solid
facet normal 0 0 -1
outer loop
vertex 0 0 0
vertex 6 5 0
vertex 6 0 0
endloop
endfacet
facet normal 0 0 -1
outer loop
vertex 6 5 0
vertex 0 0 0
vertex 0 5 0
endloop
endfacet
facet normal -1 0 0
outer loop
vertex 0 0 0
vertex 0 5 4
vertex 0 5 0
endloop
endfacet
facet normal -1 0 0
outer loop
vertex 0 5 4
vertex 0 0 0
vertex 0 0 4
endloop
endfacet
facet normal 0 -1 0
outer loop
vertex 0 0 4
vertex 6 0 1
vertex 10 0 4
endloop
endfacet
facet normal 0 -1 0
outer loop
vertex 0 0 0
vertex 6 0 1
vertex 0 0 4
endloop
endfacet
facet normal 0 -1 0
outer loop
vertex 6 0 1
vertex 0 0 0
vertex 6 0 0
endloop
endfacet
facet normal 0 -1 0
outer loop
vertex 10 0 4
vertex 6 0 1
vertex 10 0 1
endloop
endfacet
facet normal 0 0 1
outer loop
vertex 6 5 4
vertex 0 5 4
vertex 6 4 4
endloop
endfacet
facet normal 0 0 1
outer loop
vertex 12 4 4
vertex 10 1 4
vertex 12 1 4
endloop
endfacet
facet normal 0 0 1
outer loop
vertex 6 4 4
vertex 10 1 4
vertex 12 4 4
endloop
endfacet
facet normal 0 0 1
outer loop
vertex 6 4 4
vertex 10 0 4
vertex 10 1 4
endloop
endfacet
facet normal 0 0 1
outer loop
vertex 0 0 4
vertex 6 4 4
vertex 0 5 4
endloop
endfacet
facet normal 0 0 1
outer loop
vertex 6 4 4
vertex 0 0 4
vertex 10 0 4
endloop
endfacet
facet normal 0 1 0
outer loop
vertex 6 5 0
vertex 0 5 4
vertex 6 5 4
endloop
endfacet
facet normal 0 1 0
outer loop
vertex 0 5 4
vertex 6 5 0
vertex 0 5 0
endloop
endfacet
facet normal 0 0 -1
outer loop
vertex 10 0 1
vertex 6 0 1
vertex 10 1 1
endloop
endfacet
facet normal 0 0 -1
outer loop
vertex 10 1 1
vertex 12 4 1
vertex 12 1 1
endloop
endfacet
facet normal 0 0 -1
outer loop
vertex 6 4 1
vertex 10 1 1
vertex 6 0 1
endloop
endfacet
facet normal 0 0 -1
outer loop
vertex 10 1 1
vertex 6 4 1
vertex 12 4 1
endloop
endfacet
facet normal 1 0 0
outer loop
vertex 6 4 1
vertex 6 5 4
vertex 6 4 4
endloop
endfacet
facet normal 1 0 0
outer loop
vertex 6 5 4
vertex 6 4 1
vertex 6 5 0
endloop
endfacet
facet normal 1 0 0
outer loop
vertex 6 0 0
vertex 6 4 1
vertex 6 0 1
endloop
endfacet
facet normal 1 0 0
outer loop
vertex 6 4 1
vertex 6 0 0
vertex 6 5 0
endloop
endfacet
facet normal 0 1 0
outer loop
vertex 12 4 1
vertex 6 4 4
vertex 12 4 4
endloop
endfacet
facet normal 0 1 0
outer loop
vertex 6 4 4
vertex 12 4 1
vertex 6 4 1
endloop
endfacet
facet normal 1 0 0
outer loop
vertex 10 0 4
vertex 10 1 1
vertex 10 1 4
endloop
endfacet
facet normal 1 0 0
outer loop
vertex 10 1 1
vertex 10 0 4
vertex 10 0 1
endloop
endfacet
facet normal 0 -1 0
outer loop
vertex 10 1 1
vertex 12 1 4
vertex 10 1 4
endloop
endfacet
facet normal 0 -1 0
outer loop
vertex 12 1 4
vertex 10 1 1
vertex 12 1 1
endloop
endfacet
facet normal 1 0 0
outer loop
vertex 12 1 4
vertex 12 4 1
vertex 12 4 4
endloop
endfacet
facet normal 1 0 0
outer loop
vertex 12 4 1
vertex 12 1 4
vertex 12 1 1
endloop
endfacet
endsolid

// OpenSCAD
union() {
    translate([0, 0, 0]) cube([1, 1, 1]);
    translate([0, 0, 1]) cube([1, 1, 1]);
    translate([0, 0, 2]) cube([1, 1, 1]);
    translate([0, 0, 3]) cube([1, 1, 1]);
    translate([0, 1, 0]) cube([1, 1, 1]);
    translate([0, 1, 1]) cube([1, 1, 1]);
    translate([0, 1, 2]) cube([1, 1, 1]);
    translate([0, 1, 3]) cube([1, 1, 1]);
    translate([0, 2, 0]) cube([1, 1, 1]);
    translate([0, 2, 1]) cube([1, 1, 1]);
    translate([0, 2, 2]) cube([1, 1, 1]);
    translate([0, 2, 3]) cube([1, 1, 1]);
    translate([0, 3, 0]) cube([1, 1, 1]);
    translate([0, 3, 1]) cube([1, 1, 1]);
    translate([0, 3, 2]) cube([1, 1, 1]);
    translate([0, 3, 3]) cube([1, 1, 1]);
    translate([0, 4, 0]) cube([1, 1, 1]);
    translate([0, 4, 1]) cube([1, 1, 1]);
    translate([0, 4, 2]) cube([1, 1, 1]);
    translate([0, 4, 3]) cube([1, 1, 1]);
    translate([1, 0, 0]) cube([1, 1, 1]);
    translate([1, 0, 1]) cube([1, 1, 1]);
    translate([1, 0, 2]) cube([1, 1, 1]);
    translate([1, 0, 3]) cube([1, 1, 1]);
    translate([1, 1, 0]) cube([1, 1, 1]);
    translate([1, 1, 1]) cube([1, 1, 1]);
    translate([1, 1, 2]) cube([1, 1, 1]);
    translate([1, 1, 3]) cube([1, 1, 1]);
    translate([1, 2, 0]) cube([1, 1, 1]);
    translate([1, 2, 1]) cube([1, 1, 1]);
    translate([1, 2, 2]) cube([1, 1, 1]);
    translate([1, 2, 3]) cube([1, 1, 1]);
    translate([1, 3, 0]) cube([1, 1, 1]);
    translate([1, 3, 1]) cube([1, 1, 1]);
    translate([1, 3, 2]) cube([1, 1, 1]);
    translate([1, 3, 3]) cube([1, 1, 1]);
    translate([1, 4, 0]) cube([1, 1, 1]);
    translate([1, 4, 1]) cube([1, 1, 1]);
    translate([1, 4, 2]) cube([1, 1, 1]);
    translate([1, 4, 3]) cube([1, 1, 1]);
    translate([2, 0, 0]) cube([1, 1, 1]);
    translate([2, 0, 1]) cube([1, 1, 1]);
    translate([2, 0, 2]) cube([1, 1, 1]);
    translate([2, 0, 3]) cube([1, 1, 1]);
    translate([2, 1, 0]) cube([1, 1, 1]);
    translate([2, 1, 1]) cube([1, 1, 1]);
    translate([2, 1, 2]) cube([1, 1, 1]);
    translate([2, 1, 3]) cube([1, 1, 1]);
    translate([2, 2, 0]) cube([1, 1, 1]);
    translate([2, 2, 1]) cube([1, 1, 1]);
    translate([2, 2, 2]) cube([1, 1, 1]);
    translate([2, 2, 3]) cube([1, 1, 1]);
    translate([2, 3, 0]) cube([1, 1, 1]);
    translate([2, 3, 1]) cube([1, 1, 1]);
    translate([2, 3, 2]) cube([1, 1, 1]);
    translate([2, 3, 3]) cube([1, 1, 1]);
    translate([2, 4, 0]) cube([1, 1, 1]);
    translate([2, 4, 1]) cube([1, 1, 1]);
    translate([2, 4, 2]) cube([1, 1, 1]);
    translate([2, 4, 3]) cube([1, 1, 1]);
    translate([3, 0, 0]) cube([1, 1, 1]);
    translate([3, 0, 1]) cube([1, 1, 1]);
    translate([3, 0, 2]) cube([1, 1, 1]);
    translate([3, 0, 3]) cube([1, 1, 1]);
    translate([3, 1, 0]) cube([1, 1, 1]);
    translate([3, 1, 1]) cube([1, 1, 1]);
    translate([3, 1, 2]) cube([1, 1, 1]);
    translate([3, 1, 3]) cube([1, 1, 1]);
    translate([3, 2, 0]) cube([1, 1, 1]);
    translate([3, 2, 1]) cube([1, 1, 1]);
    translate([3, 2, 2]) cube([1, 1, 1]);
    translate([3, 2, 3]) cube([1, 1, 1]);
    translate([3, 3, 0]) cube([1, 1, 1]);
    translate([3, 3, 1]) cube([1, 1, 1]);
    translate([3, 3, 2]) cube([1, 1, 1]);
    translate([3, 3, 3]) cube([1, 1, 1]);
    translate([3, 4, 0]) cube([1, 1, 1]);
    translate([3, 4, 1]) cube([1, 1, 1]);
    translate([3, 4, 2]) cube([1, 1, 1]);
    translate([3, 4, 3]) cube([1, 1, 1]);
    translate([4, 0, 0]) cube([1, 1, 1]);
    translate([4, 0, 1]) cube([1, 1, 1]);
    translate([4, 0, 2]) cube([1, 1, 1]);
    translate([4, 0, 3]) cube([1, 1, 1]);
    translate([4, 1, 0]) cube([1, 1, 1]);
    translate([4, 1, 1]) cube([1, 1, 1]);
    translate([4, 1, 2]) cube([1, 1, 1]);
    translate([4, 1, 3]) cube([1, 1, 1]);
    translate([4, 2, 0]) cube([1, 1, 1]);
    translate([4, 2, 1]) cube([1, 1, 1]);
    translate([4, 2, 2]) cube([1, 1, 1]);
    translate([4, 2, 3]) cube([1, 1, 1]);
    translate([4, 3, 0]) cube([1, 1, 1]);
    translate([4, 3, 1]) cube([1, 1, 1]);
    translate([4, 3, 2]) cube([1, 1, 1]);
    translate([4, 3, 3]) cube([1, 1, 1]);
    translate([4, 4, 0]) cube([1, 1, 1]);
    translate([4, 4, 1]) cube([1, 1, 1]);
    translate([4, 4, 2]) cube([1, 1, 1]);
    translate([4, 4, 3]) cube([1, 1, 1]);
    translate([5, 0, 0]) cube([1, 1, 1]);
    translate([5, 0, 1]) cube([1, 1, 1]);
    translate([5, 0, 2]) cube([1, 1, 1]);
    translate([5, 0, 3]) cube([1, 1, 1]);
    translate([5, 1, 0]) cube([1, 1, 1]);
    translate([5, 1, 1]) cube([1, 1, 1]);
    translate([5, 1, 2]) cube([1, 1, 1]);
    translate([5, 1, 3]) cube([1, 1, 1]);
    translate([5, 2, 0]) cube([1, 1, 1]);
    translate([5, 2, 1]) cube([1, 1, 1]);
    translate([5, 2, 2]) cube([1, 1, 1]);
    translate([5, 2, 3]) cube([1, 1, 1]);
    translate([5, 3, 0]) cube([1, 1, 1]);
    translate([5, 3, 1]) cube([1, 1, 1]);
    translate([5, 3, 2]) cube([1, 1, 1]);
    translate([5, 3, 3]) cube([1, 1, 1]);
    translate([5, 4, 0]) cube([1, 1, 1]);
    translate([5, 4, 1]) cube([1, 1, 1]);
    translate([5, 4, 2]) cube([1, 1, 1]);
    translate([5, 4, 3]) cube([1, 1, 1]);
    translate([6, 0, 1]) cube([1, 1, 1]);
    translate([6, 0, 2]) cube([1, 1, 1]);
    translate([6, 0, 3]) cube([1, 1, 1]);
    translate([6, 1, 1]) cube([1, 1, 1]);
    translate([6, 1, 2]) cube([1, 1, 1]);
    translate([6, 1, 3]) cube([1, 1, 1]);
    translate([6, 2, 1]) cube([1, 1, 1]);
    translate([6, 2, 2]) cube([1, 1, 1]);
    translate([6, 2, 3]) cube([1, 1, 1]);
    translate([6, 3, 1]) cube([1, 1, 1]);
    translate([6, 3, 2]) cube([1, 1, 1]);
    translate([6, 3, 3]) cube([1, 1, 1]);
    translate([7, 0, 1]) cube([1, 1, 1]);
    translate([7, 0, 2]) cube([1, 1, 1]);
    translate([7, 0, 3]) cube([1, 1, 1]);
    translate([7, 1, 1]) cube([1, 1, 1]);
    translate([7, 1, 2]) cube([1, 1, 1]);
    translate([7, 1, 3]) cube([1, 1, 1]);
    translate([7, 2, 1]) cube([1, 1, 1]);
    translate([7, 2, 2]) cube([1, 1, 1]);
    translate([7, 2, 3]) cube([1, 1, 1]);
    translate([7, 3, 1]) cube([1, 1, 1]);
    translate([7, 3, 2]) cube([1, 1, 1]);
    translate([7, 3, 3]) cube([1, 1, 1]);
    translate([8, 0, 1]) cube([1, 1, 1]);
    translate([8, 0, 2]) cube([1, 1, 1]);
    translate([8, 0, 3]) cube([1, 1, 1]);
    translate([8, 1, 1]) cube([1, 1, 1]);
    translate([8, 1, 2]) cube([1, 1, 1]);
    translate([8, 1, 3]) cube([1, 1, 1]);
    translate([8, 2, 1]) cube([1, 1, 1]);
    translate([8, 2, 2]) cube([1, 1, 1]);
    translate([8, 2, 3]) cube([1, 1, 1]);
    translate([8, 3, 1]) cube([1, 1, 1]);
    translate([8, 3, 2]) cube([1, 1, 1]);
    translate([8, 3, 3]) cube([1, 1, 1]);
    translate([9, 0, 1]) cube([1, 1, 1]);
    translate([9, 0, 2]) cube([1, 1, 1]);
    translate([9, 0, 3]) cube([1, 1, 1]);
    translate([9, 1, 1]) cube([1, 1, 1]);
    translate([9, 1, 2]) cube([1, 1, 1]);
    translate([9, 1, 3]) cube([1, 1, 1]);
    translate([9, 2, 1]) cube([1, 1, 1]);
    translate([9, 2, 2]) cube([1, 1, 1]);
    translate([9, 2, 3]) cube([1, 1, 1]);
    translate([9, 3, 1]) cube([1, 1, 1]);
    translate([9, 3, 2]) cube([1, 1, 1]);
    translate([9, 3, 3]) cube([1, 1, 1]);
    translate([10, 1, 1]) cube([1, 1, 1]);
    translate([10, 1, 2]) cube([1, 1, 1]);
    translate([10, 1, 3]) cube([1, 1, 1]);
    translate([10, 2, 1]) cube([1, 1, 1]);
    translate([10, 2, 2]) cube([1, 1, 1]);
    translate([10, 2, 3]) cube([1, 1, 1]);
    translate([10, 3, 1]) cube([1, 1, 1]);
    translate([10, 3, 2]) cube([1, 1, 1]);
    translate([10, 3, 3]) cube([1, 1, 1]);
    translate([11, 1, 1]) cube([1, 1, 1]);
    translate([11, 1, 2]) cube([1, 1, 1]);
    translate([11, 1, 3]) cube([1, 1, 1]);
    translate([11, 2, 1]) cube([1, 1, 1]);
    translate([11, 2, 2]) cube([1, 1, 1]);
    translate([11, 2, 3]) cube([1, 1, 1]);
    translate([11, 3, 1]) cube([1, 1, 1]);
    translate([11, 3, 2]) cube([1, 1, 1]);
    translate([11, 3, 3]) cube([1, 1, 1]);
}
